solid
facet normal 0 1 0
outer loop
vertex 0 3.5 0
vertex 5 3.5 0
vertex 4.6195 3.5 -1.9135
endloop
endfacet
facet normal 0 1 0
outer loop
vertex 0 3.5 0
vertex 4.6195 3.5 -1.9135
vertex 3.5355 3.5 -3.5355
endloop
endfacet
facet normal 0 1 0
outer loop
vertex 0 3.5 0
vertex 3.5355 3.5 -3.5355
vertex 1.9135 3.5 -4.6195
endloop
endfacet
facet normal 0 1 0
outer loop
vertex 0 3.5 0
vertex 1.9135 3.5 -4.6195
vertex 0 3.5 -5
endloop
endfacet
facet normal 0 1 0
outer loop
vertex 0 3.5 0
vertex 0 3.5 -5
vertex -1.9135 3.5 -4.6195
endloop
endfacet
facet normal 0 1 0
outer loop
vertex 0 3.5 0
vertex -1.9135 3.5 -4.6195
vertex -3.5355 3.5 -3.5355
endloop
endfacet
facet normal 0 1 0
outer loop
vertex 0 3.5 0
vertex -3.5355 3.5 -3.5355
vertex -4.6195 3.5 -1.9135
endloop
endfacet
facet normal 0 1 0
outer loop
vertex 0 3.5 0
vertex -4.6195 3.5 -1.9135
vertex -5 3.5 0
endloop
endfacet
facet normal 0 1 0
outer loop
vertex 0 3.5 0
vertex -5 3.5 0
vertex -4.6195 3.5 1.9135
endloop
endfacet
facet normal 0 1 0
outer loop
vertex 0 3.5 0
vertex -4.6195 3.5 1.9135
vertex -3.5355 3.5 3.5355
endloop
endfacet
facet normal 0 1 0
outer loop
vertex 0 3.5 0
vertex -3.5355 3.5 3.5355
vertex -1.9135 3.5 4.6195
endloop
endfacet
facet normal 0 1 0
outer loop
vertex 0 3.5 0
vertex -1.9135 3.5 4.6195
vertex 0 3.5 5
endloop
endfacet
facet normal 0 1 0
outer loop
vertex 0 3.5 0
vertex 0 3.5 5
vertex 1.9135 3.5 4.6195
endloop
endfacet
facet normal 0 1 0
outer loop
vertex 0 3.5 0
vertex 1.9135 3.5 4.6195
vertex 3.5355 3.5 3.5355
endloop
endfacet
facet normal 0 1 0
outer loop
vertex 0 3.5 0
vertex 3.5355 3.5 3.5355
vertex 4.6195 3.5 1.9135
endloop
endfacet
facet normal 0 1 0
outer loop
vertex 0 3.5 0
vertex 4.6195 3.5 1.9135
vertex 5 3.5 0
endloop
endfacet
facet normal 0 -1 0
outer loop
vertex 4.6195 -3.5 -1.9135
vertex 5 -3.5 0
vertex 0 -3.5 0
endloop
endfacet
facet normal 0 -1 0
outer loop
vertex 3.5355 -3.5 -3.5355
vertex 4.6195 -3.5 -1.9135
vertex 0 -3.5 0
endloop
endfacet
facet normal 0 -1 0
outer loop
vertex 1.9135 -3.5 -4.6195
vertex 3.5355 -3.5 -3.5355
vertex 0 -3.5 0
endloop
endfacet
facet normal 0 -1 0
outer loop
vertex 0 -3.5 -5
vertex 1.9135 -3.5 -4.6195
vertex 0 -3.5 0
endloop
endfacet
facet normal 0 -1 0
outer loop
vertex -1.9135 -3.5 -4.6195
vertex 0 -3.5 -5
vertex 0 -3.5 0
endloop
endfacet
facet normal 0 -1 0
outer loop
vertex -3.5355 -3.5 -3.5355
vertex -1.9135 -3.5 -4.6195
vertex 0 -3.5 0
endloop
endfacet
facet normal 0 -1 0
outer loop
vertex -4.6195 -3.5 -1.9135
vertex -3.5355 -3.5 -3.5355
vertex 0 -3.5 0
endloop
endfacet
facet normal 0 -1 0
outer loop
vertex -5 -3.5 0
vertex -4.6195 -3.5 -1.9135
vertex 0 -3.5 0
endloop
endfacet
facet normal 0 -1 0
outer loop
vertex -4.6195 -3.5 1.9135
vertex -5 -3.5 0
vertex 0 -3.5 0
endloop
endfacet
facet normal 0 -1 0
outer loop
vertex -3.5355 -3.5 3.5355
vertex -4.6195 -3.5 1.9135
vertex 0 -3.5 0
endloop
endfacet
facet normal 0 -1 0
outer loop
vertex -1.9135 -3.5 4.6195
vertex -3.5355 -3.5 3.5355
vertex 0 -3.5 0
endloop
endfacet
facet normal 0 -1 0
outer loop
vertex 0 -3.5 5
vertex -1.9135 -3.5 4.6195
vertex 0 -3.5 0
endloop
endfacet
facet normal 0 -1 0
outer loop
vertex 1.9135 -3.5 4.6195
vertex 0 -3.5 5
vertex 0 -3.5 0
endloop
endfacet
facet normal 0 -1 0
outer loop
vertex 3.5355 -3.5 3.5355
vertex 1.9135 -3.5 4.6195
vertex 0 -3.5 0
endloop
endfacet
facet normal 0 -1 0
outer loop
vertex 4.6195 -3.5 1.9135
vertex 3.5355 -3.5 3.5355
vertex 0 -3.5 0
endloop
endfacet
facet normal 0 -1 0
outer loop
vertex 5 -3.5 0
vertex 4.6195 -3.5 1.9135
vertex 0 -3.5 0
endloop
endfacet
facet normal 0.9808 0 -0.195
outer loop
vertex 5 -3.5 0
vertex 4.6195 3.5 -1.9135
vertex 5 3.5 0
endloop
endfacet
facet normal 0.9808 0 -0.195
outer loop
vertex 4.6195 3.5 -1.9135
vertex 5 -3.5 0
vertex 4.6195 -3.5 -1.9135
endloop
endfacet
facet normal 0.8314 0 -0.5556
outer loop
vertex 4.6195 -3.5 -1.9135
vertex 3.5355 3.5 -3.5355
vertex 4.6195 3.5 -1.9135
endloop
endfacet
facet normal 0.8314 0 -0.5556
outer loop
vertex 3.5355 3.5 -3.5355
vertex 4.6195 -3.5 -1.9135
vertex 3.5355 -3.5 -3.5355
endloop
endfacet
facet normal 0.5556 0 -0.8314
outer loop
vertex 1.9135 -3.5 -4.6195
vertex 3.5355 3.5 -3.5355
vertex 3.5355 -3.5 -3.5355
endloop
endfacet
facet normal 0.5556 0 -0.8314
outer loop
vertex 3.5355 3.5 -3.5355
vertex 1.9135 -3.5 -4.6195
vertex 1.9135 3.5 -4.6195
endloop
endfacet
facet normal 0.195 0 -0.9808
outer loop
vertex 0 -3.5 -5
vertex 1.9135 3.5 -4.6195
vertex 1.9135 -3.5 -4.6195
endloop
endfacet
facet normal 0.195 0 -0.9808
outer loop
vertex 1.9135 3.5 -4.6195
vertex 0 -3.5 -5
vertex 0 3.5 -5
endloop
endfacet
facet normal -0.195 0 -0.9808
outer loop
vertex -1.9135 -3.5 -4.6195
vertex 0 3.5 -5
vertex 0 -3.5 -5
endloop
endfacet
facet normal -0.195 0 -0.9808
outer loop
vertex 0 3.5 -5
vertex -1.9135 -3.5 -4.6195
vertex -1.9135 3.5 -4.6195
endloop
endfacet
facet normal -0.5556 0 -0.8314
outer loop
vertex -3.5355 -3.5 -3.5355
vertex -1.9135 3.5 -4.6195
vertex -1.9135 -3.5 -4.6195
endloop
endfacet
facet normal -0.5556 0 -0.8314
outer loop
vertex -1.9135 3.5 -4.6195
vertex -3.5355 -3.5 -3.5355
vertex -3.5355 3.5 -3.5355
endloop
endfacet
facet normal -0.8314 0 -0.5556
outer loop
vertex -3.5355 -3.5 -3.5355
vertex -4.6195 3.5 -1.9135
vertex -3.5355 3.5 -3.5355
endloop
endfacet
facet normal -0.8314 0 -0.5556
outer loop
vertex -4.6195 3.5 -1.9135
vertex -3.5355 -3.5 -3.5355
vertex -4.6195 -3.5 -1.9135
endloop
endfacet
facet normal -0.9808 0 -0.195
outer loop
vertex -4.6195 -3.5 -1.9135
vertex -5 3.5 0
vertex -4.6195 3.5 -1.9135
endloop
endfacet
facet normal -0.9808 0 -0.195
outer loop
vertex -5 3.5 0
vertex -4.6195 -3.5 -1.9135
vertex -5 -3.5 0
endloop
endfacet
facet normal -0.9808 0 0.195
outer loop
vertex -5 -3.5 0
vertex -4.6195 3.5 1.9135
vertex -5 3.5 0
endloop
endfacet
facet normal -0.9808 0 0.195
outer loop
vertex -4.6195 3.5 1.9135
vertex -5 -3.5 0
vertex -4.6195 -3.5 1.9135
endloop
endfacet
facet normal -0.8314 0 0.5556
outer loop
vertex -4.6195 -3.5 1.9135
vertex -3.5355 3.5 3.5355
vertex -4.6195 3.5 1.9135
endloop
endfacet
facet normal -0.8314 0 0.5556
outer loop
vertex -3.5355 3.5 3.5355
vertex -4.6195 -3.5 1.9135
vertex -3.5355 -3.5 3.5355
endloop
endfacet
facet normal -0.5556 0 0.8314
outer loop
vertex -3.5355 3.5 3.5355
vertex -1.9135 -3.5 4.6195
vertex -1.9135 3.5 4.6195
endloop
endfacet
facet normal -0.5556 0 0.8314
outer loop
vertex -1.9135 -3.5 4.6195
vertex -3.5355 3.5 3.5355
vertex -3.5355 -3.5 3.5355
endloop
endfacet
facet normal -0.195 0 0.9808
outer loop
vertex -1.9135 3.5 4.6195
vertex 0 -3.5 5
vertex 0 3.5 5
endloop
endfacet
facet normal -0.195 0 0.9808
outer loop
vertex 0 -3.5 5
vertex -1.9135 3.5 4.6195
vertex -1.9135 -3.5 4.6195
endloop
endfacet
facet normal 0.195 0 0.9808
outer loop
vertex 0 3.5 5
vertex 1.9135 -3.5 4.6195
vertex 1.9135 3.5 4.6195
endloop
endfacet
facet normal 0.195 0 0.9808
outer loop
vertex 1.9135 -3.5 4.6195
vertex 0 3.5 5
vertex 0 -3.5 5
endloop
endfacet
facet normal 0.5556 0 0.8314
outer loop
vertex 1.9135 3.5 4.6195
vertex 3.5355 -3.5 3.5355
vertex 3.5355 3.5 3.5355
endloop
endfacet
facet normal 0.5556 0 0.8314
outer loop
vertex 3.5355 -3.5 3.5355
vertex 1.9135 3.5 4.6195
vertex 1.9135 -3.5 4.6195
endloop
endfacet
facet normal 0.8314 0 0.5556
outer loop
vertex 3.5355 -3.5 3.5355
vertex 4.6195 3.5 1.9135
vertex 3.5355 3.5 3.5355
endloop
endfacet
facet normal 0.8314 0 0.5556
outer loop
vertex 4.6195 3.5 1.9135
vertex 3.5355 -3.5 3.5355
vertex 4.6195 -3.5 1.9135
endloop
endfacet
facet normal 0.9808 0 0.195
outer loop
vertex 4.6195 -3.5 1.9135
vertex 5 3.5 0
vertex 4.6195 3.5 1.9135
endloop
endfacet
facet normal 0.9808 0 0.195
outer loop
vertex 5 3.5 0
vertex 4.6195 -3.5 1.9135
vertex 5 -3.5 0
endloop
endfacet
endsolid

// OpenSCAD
// file: ../p/4-4edge.scad
use <../lib.scad>
function ldraw_lib__4_4edge() = [
// 0 Circle 1.0
// 0 Name: 4-4edge.dat
// 0 Author: James Jessiman
// 0 !LDRAW_ORG Primitive UPDATE 2017-01
// 0 !LICENSE Licensed under CC BY 4.0 : see CAreadme.txt
// 
// 0 BFC CERTIFY CCW
  [0,"BFC","CERTIFY"],
  [0,"BFC","CCW"],
// 
// 0 !HISTORY 1998-12-15 [PTadmin] Official Update 1998-10
// 0 !HISTORY 2005-12-28 [PTadmin] Official Update 2005-01
// 0 !HISTORY 2007-06-24 [PTadmin] Header formatted for Contributor Agreement
// 0 !HISTORY 2008-07-01 [PTadmin] Official Update 2008-01
// 0 !HISTORY 2017-01-15 [Steffen] BFCed
// 0 !HISTORY 2017-12-30 [PTadmin] Official Update 2017-01
// 
// 
// 2 24 1 0 0 0.9239 0 0.3827
  [2,24,1,0,0,0.9239,0,0.3827],
// 2 24 0.9239 0 0.3827 0.7071 0 0.7071
  [2,24,0.9239,0,0.3827,0.7071,0,0.7071],
// 2 24 0.7071 0 0.7071 0.3827 0 0.9239
  [2,24,0.7071,0,0.7071,0.3827,0,0.9239],
// 2 24 0.3827 0 0.9239 0 0 1
  [2,24,0.3827,0,0.9239,0,0,1],
// 2 24 0 0 1 -0.3827 0 0.9239
  [2,24,0,0,1,-0.3827,0,0.9239],
// 2 24 -0.3827 0 0.9239 -0.7071 0 0.7071
  [2,24,-0.3827,0,0.9239,-0.7071,0,0.7071],
// 2 24 -0.7071 0 0.7071 -0.9239 0 0.3827
  [2,24,-0.7071,0,0.7071,-0.9239,0,0.3827],
// 2 24 -0.9239 0 0.3827 -1 0 -0
  [2,24,-0.9239,0,0.3827,-1,0,-0],
// 2 24 -1 0 -0 -0.9239 0 -0.3827
  [2,24,-1,0,-0,-0.9239,0,-0.3827],
// 2 24 -0.9239 0 -0.3827 -0.7071 0 -0.7071
  [2,24,-0.9239,0,-0.3827,-0.7071,0,-0.7071],
// 2 24 -0.7071 0 -0.7071 -0.3827 0 -0.9239
  [2,24,-0.7071,0,-0.7071,-0.3827,0,-0.9239],
// 2 24 -0.3827 0 -0.9239 0 0 -1
  [2,24,-0.3827,0,-0.9239,0,0,-1],
// 2 24 0 0 -1 0.3827 0 -0.9239
  [2,24,0,0,-1,0.3827,0,-0.9239],
// 2 24 0.3827 0 -0.9239 0.7071 0 -0.7071
  [2,24,0.3827,0,-0.9239,0.7071,0,-0.7071],
// 2 24 0.7071 0 -0.7071 0.9239 0 -0.3827
  [2,24,0.7071,0,-0.7071,0.9239,0,-0.3827],
// 2 24 0.9239 0 -0.3827 1 0 0
  [2,24,0.9239,0,-0.3827,1,0,0],
];
module ldraw_lib__4_4edge(step=0, col=false, unit=2/5, alt=false, line=0.2, solid=!$preview)
    makepoly(ldraw_lib__4_4edge(), step=step, col=col, unit=unit, alt=alt, line=line, solid=solid);
ldraw_lib__4_4edge(line=0.2);
// file: ../p/4-4cyli.scad
use <../lib.scad>
function ldraw_lib__4_4cyli() = [
// 0 Cylinder 1.0
// 0 Name: 4-4cyli.dat
// 0 Author: James Jessiman
// 0 !LDRAW_ORG Primitive UPDATE 2005-01
// 0 !LICENSE Licensed under CC BY 4.0 : see CAreadme.txt
// 
// 0 BFC CERTIFY CCW
  [0,"BFC","CERTIFY"],
  [0,"BFC","CCW"],
// 
// 0 !HISTORY 1998-12-15 [PTadmin] Official Update 1998-10
// 0 !HISTORY 2002-03-23 [sbliss] Added BFC statement; merged headers from files in distributions LDraw 0.27 and Complete.
// 0 !HISTORY 2002-04-25 [PTadmin] Official Update 2002-02
// 0 !HISTORY 2004-12-14 [guyvivan] BFC CCW
// 0 !HISTORY 2005-12-28 [PTadmin] Official Update 2005-01
// 0 !HISTORY 2007-06-24 [PTadmin] Header formatted for Contributor Agreement
// 0 !HISTORY 2008-07-01 [PTadmin] Official Update 2008-01
// 
// 
// 4 16 1 1 0 0.9239 1 0.3827 0.9239 0 0.3827 1 0 0
  [4,16,1,1,0,0.9239,1,0.3827,0.9239,0,0.3827,1,0,0],
// 5 24 1 0 0 1 1 0 0.9239 0 0.3827 0.9239 0 -0.3827
  [5,24,1,0,0,1,1,0,0.9239,0,0.3827,0.9239,0,-0.3827],
// 4 16 0.9239 1 0.3827 0.7071 1 0.7071 0.7071 0 0.7071 0.9239 0 0.3827
  [4,16,0.9239,1,0.3827,0.7071,1,0.7071,0.7071,0,0.7071,0.9239,0,0.3827],
// 5 24 0.9239 0 0.3827 0.9239 1 0.3827 0.7071 0 0.7071 1 0 0
  [5,24,0.9239,0,0.3827,0.9239,1,0.3827,0.7071,0,0.7071,1,0,0],
// 4 16 0.7071 1 0.7071 0.3827 1 0.9239 0.3827 0 0.9239 0.7071 0 0.7071
  [4,16,0.7071,1,0.7071,0.3827,1,0.9239,0.3827,0,0.9239,0.7071,0,0.7071],
// 5 24 0.7071 0 0.7071 0.7071 1 0.7071 0.3827 0 0.9239 0.9239 0 0.3827
  [5,24,0.7071,0,0.7071,0.7071,1,0.7071,0.3827,0,0.9239,0.9239,0,0.3827],
// 4 16 0.3827 1 0.9239 0 1 1 0 0 1 0.3827 0 0.9239
  [4,16,0.3827,1,0.9239,0,1,1,0,0,1,0.3827,0,0.9239],
// 5 24 0.3827 0 0.9239 0.3827 1 0.9239 0 0 1 0.7071 0 0.7071
  [5,24,0.3827,0,0.9239,0.3827,1,0.9239,0,0,1,0.7071,0,0.7071],
// 4 16 0 1 1 -0.3827 1 0.9239 -0.3827 0 0.9239 0 0 1
  [4,16,0,1,1,-0.3827,1,0.9239,-0.3827,0,0.9239,0,0,1],
// 5 24 0 0 1 0 1 1 -0.3827 0 0.9239 0.3827 0 0.9239
  [5,24,0,0,1,0,1,1,-0.3827,0,0.9239,0.3827,0,0.9239],
// 4 16 -0.3827 1 0.9239 -0.7071 1 0.7071 -0.7071 0 0.7071 -0.3827 0 0.9239
  [4,16,-0.3827,1,0.9239,-0.7071,1,0.7071,-0.7071,0,0.7071,-0.3827,0,0.9239],
// 5 24 -0.3827 0 0.9239 -0.3827 1 0.9239 -0.7071 0 0.7071 0 0 1
  [5,24,-0.3827,0,0.9239,-0.3827,1,0.9239,-0.7071,0,0.7071,0,0,1],
// 4 16 -0.7071 1 0.7071 -0.9239 1 0.3827 -0.9239 0 0.3827 -0.7071 0 0.7071
  [4,16,-0.7071,1,0.7071,-0.9239,1,0.3827,-0.9239,0,0.3827,-0.7071,0,0.7071],
// 5 24 -0.7071 0 0.7071 -0.7071 1 0.7071 -0.9239 0 0.3827 -0.3827 0 0.9239
  [5,24,-0.7071,0,0.7071,-0.7071,1,0.7071,-0.9239,0,0.3827,-0.3827,0,0.9239],
// 4 16 -0.9239 1 0.3827 -1 1 0 -1 0 0 -0.9239 0 0.3827
  [4,16,-0.9239,1,0.3827,-1,1,0,-1,0,0,-0.9239,0,0.3827],
// 5 24 -0.9239 0 0.3827 -0.9239 1 0.3827 -1 0 0 -0.7071 0 0.7071
  [5,24,-0.9239,0,0.3827,-0.9239,1,0.3827,-1,0,0,-0.7071,0,0.7071],
// 4 16 -1 1 0 -0.9239 1 -0.3827 -0.9239 0 -0.3827 -1 0 0
  [4,16,-1,1,0,-0.9239,1,-0.3827,-0.9239,0,-0.3827,-1,0,0],
// 5 24 -1 0 0 -1 1 0 -0.9239 0 -0.3827 -0.9239 0 0.3827
  [5,24,-1,0,0,-1,1,0,-0.9239,0,-0.3827,-0.9239,0,0.3827],
// 4 16 -0.9239 1 -0.3827 -0.7071 1 -0.7071 -0.7071 0 -0.7071 -0.9239 0 -0.3827
  [4,16,-0.9239,1,-0.3827,-0.7071,1,-0.7071,-0.7071,0,-0.7071,-0.9239,0,-0.3827],
// 5 24 -0.9239 0 -0.3827 -0.9239 1 -0.3827 -0.7071 0 -0.7071 -1 0 0
  [5,24,-0.9239,0,-0.3827,-0.9239,1,-0.3827,-0.7071,0,-0.7071,-1,0,0],
// 4 16 -0.7071 1 -0.7071 -0.3827 1 -0.9239 -0.3827 0 -0.9239 -0.7071 0 -0.7071
  [4,16,-0.7071,1,-0.7071,-0.3827,1,-0.9239,-0.3827,0,-0.9239,-0.7071,0,-0.7071],
// 5 24 -0.7071 0 -0.7071 -0.7071 1 -0.7071 -0.3827 0 -0.9239 -0.9239 0 -0.3827
  [5,24,-0.7071,0,-0.7071,-0.7071,1,-0.7071,-0.3827,0,-0.9239,-0.9239,0,-0.3827],
// 4 16 -0.3827 1 -0.9239 0 1 -1 0 0 -1 -0.3827 0 -0.9239
  [4,16,-0.3827,1,-0.9239,0,1,-1,0,0,-1,-0.3827,0,-0.9239],
// 5 24 -0.3827 0 -0.9239 -0.3827 1 -0.9239 0 0 -1 -0.7071 0 -0.7071
  [5,24,-0.3827,0,-0.9239,-0.3827,1,-0.9239,0,0,-1,-0.7071,0,-0.7071],
// 4 16 0 1 -1 0.3827 1 -0.9239 0.3827 0 -0.9239 0 0 -1
  [4,16,0,1,-1,0.3827,1,-0.9239,0.3827,0,-0.9239,0,0,-1],
// 5 24 0 0 -1 0 1 -1 0.3827 0 -0.9239 -0.3827 0 -0.9239
  [5,24,0,0,-1,0,1,-1,0.3827,0,-0.9239,-0.3827,0,-0.9239],
// 4 16 0.3827 1 -0.9239 0.7071 1 -0.7071 0.7071 0 -0.7071 0.3827 0 -0.9239
  [4,16,0.3827,1,-0.9239,0.7071,1,-0.7071,0.7071,0,-0.7071,0.3827,0,-0.9239],
// 5 24 0.3827 0 -0.9239 0.3827 1 -0.9239 0.7071 0 -0.7071 0 0 -1
  [5,24,0.3827,0,-0.9239,0.3827,1,-0.9239,0.7071,0,-0.7071,0,0,-1],
// 4 16 0.7071 1 -0.7071 0.9239 1 -0.3827 0.9239 0 -0.3827 0.7071 0 -0.7071
  [4,16,0.7071,1,-0.7071,0.9239,1,-0.3827,0.9239,0,-0.3827,0.7071,0,-0.7071],
// 5 24 0.7071 0 -0.7071 0.7071 1 -0.7071 0.9239 0 -0.3827 0.3827 0 -0.9239
  [5,24,0.7071,0,-0.7071,0.7071,1,-0.7071,0.9239,0,-0.3827,0.3827,0,-0.9239],
// 4 16 0.9239 1 -0.3827 1 1 0 1 0 0 0.9239 0 -0.3827
  [4,16,0.9239,1,-0.3827,1,1,0,1,0,0,0.9239,0,-0.3827],
// 5 24 0.9239 0 -0.3827 0.9239 1 -0.3827 1 0 0 0.7071 0 -0.7071
  [5,24,0.9239,0,-0.3827,0.9239,1,-0.3827,1,0,0,0.7071,0,-0.7071],
// 0
];
module ldraw_lib__4_4cyli(step=0, col=false, unit=2/5, alt=false, line=0.2, solid=!$preview)
    makepoly(ldraw_lib__4_4cyli(), step=step, col=col, unit=unit, alt=alt, line=line, solid=solid);
ldraw_lib__4_4cyli(line=0.2);
// file: ../p/4-4disc.scad
use <../lib.scad>
function ldraw_lib__4_4disc() = [
// 0 Disc 1.0
// 0 Name: 4-4disc.dat
// 0 Author: James Jessiman
// 0 !LDRAW_ORG Primitive UPDATE 2002-02
// 0 !LICENSE Licensed under CC BY 4.0 : see CAreadme.txt
// 
// 0 BFC CERTIFY CCW
  [0,"BFC","CERTIFY"],
  [0,"BFC","CCW"],
// 
// 0 !HISTORY 1998-12-15 [PTadmin] Official Update 1998-10
// 0 !HISTORY 2002-03-23 [sbliss] Added BFC statement
// 0 !HISTORY 2002-04-25 [PTadmin] Official Update 2002-02
// 0 !HISTORY 2007-06-24 [PTadmin] Header formatted for Contributor Agreement
// 0 !HISTORY 2008-07-01 [PTadmin] Official Update 2008-01
// 
// 
// 3 16 0 0 0 1 0 0 0.9239 0 0.3827
  [3,16,0,0,0,1,0,0,0.9239,0,0.3827],
// 3 16 0 0 0 0.9239 0 0.3827 0.7071 0 0.7071
  [3,16,0,0,0,0.9239,0,0.3827,0.7071,0,0.7071],
// 3 16 0 0 0 0.7071 0 0.7071 0.3827 0 0.9239
  [3,16,0,0,0,0.7071,0,0.7071,0.3827,0,0.9239],
// 3 16 0 0 0 0.3827 0 0.9239 0 0 1
  [3,16,0,0,0,0.3827,0,0.9239,0,0,1],
// 3 16 0 0 0 0 0 1 -0.3827 0 0.9239
  [3,16,0,0,0,0,0,1,-0.3827,0,0.9239],
// 3 16 0 0 0 -0.3827 0 0.9239 -0.7071 0 0.7071
  [3,16,0,0,0,-0.3827,0,0.9239,-0.7071,0,0.7071],
// 3 16 0 0 0 -0.7071 0 0.7071 -0.9239 0 0.3827
  [3,16,0,0,0,-0.7071,0,0.7071,-0.9239,0,0.3827],
// 3 16 0 0 0 -0.9239 0 0.3827 -1 0 -0
  [3,16,0,0,0,-0.9239,0,0.3827,-1,0,-0],
// 3 16 0 0 0 -1 0 -0 -0.9239 0 -0.3827
  [3,16,0,0,0,-1,0,-0,-0.9239,0,-0.3827],
// 3 16 0 0 0 -0.9239 0 -0.3827 -0.7071 0 -0.7071
  [3,16,0,0,0,-0.9239,0,-0.3827,-0.7071,0,-0.7071],
// 3 16 0 0 0 -0.7071 0 -0.7071 -0.3827 0 -0.9239
  [3,16,0,0,0,-0.7071,0,-0.7071,-0.3827,0,-0.9239],
// 3 16 0 0 0 -0.3827 0 -0.9239 0 0 -1
  [3,16,0,0,0,-0.3827,0,-0.9239,0,0,-1],
// 3 16 0 0 0 0 0 -1 0.3827 0 -0.9239
  [3,16,0,0,0,0,0,-1,0.3827,0,-0.9239],
// 3 16 0 0 0 0.3827 0 -0.9239 0.7071 0 -0.7071
  [3,16,0,0,0,0.3827,0,-0.9239,0.7071,0,-0.7071],
// 3 16 0 0 0 0.7071 0 -0.7071 0.9239 0 -0.3827
  [3,16,0,0,0,0.7071,0,-0.7071,0.9239,0,-0.3827],
// 3 16 0 0 0 0.9239 0 -0.3827 1 0 0
  [3,16,0,0,0,0.9239,0,-0.3827,1,0,0],
// 0
];
module ldraw_lib__4_4disc(step=0, col=false, unit=2/5, alt=false, line=0.2, solid=!$preview)
    makepoly(ldraw_lib__4_4disc(), step=step, col=col, unit=unit, alt=alt, line=line, solid=solid);
ldraw_lib__4_4disc(line=0.2);
// file: ../p/4-4cylo.scad
use <../lib.scad>
use <4-4cyli.scad>
use <4-4edge.scad>
function ldraw_lib__4_4cylo() = [
// 0 Cylinder Open 1.0
// 0 Name: 4-4cylo.dat
// 0 Author: Mark Kennedy [mkennedy]
// 0 !LDRAW_ORG Primitive UPDATE 2010-01
// 0 !LICENSE Licensed under CC BY 4.0 : see CAreadme.txt
// 
// 0 BFC CERTIFY CCW
  [0,"BFC","CERTIFY"],
  [0,"BFC","CCW"],
// 
// 0 !HISTORY 2010-04-05 [PTadmin] Official Update 2010-01
// 
// 
// 1 16 0 0 0 1 0 0 0 1 0 0 0 1 4-4edge.dat
  [1,16,0,0,0,1,0,0,0,1,0,0,0,1, ldraw_lib__4_4edge()],
// 1 16 0 1 0 1 0 0 0 1 0 0 0 1 4-4edge.dat
  [1,16,0,1,0,1,0,0,0,1,0,0,0,1, ldraw_lib__4_4edge()],
// 1 16 0 0 0 1 0 0 0 1 0 0 0 1 4-4cyli.dat
  [1,16,0,0,0,1,0,0,0,1,0,0,0,1, ldraw_lib__4_4cyli()],
// 0
];
module ldraw_lib__4_4cylo(step=0, col=false, unit=2/5, alt=false, line=0.2, solid=!$preview)
    makepoly(ldraw_lib__4_4cylo(), step=step, col=col, unit=unit, alt=alt, line=line, solid=solid);
ldraw_lib__4_4cylo(line=0.2);
// file: 70023b.scad
use <../lib.scad>
use <../p/4-4cylo.scad>
use <../p/4-4disc.scad>
function ldraw_lib__70023b() = [
// 0 ~Magnet Cylindrical 7mm (17.5LDU)
// 0 Name: 70023b.dat
// 0 Author: Rene Rechthaler [Blechtaler]
// 0 !LDRAW_ORG Part UPDATE 2025-05
// 0 !LICENSE Licensed under CC BY 4.0 : see CAreadme.txt
// 
// 0 BFC CERTIFY CCW
  [0,"BFC","CERTIFY"],
  [0,"BFC","CCW"],
// 
// 0 !HISTORY 2025-03-17 [Blechtaler] Rework for correct magnet size
// 0 !HISTORY 2025-05-28 [OrionP] Official Update 2025-05
// 
// 1 16 0 0 8.75 12.5 0 0 0 0 12.5 0 -1 0 4-4disc.dat
  [1,16,0,0,8.75,12.5,0,0,0,0,12.5,0,-1,0, ldraw_lib__4_4disc()],
// 1 16 0 0 -8.75 12.5 0 0 0 0 12.5 0 1 0 4-4disc.dat
  [1,16,0,0,-8.75,12.5,0,0,0,0,12.5,0,1,0, ldraw_lib__4_4disc()],
// 1 16 0 0 -8.75 12.5 0 0 0 0 12.5 0 17.5 0 4-4cylo.dat
  [1,16,0,0,-8.75,12.5,0,0,0,0,12.5,0,17.5,0, ldraw_lib__4_4cylo()],
];
module ldraw_lib__70023b(step=0, col=false, unit=2/5, alt=false, line=0.2, solid=!$preview)
    makepoly(ldraw_lib__70023b(), step=step, col=col, unit=unit, alt=alt, line=line, solid=solid);
ldraw_lib__70023b(line=0.2);
// main file
use <../lib.scad>
use <70023b.scad>
function ldraw_lib__70793b() = [
// 0 =Magnet Cylindrical
// 0 Name: 70793b.dat
// 0 Author: Rene Rechthaler [Blechtaler]
// 0 !LDRAW_ORG Part Alias UPDATE 2025-05
// 0 !LICENSE Licensed under CC BY 4.0 : see CAreadme.txt
// 
// 0 BFC CERTIFY CCW
  [0,"BFC","CERTIFY"],
  [0,"BFC","CCW"],
// 
// 0 !HISTORY 2025-03-24 [Blechtaler] alias of new 70023b
// 0 !HISTORY 2025-05-28 [OrionP] Official Update 2025-05
// 
// 0 // Alias of 70023b
// 
// 1 16 0 0 0 1 0 0 0 1 0 0 0 1 70023b.dat
  [1,16,0,0,0,1,0,0,0,1,0,0,0,1, ldraw_lib__70023b()],
];
module ldraw_lib__70793b(step=0, col=false, unit=2/5, alt=false, line=0.2, solid=!$preview)
    makepoly(ldraw_lib__70793b(), step=step, col=col, unit=unit, alt=alt, line=line, solid=solid);
ldraw_lib__70793b(line=0.2);
